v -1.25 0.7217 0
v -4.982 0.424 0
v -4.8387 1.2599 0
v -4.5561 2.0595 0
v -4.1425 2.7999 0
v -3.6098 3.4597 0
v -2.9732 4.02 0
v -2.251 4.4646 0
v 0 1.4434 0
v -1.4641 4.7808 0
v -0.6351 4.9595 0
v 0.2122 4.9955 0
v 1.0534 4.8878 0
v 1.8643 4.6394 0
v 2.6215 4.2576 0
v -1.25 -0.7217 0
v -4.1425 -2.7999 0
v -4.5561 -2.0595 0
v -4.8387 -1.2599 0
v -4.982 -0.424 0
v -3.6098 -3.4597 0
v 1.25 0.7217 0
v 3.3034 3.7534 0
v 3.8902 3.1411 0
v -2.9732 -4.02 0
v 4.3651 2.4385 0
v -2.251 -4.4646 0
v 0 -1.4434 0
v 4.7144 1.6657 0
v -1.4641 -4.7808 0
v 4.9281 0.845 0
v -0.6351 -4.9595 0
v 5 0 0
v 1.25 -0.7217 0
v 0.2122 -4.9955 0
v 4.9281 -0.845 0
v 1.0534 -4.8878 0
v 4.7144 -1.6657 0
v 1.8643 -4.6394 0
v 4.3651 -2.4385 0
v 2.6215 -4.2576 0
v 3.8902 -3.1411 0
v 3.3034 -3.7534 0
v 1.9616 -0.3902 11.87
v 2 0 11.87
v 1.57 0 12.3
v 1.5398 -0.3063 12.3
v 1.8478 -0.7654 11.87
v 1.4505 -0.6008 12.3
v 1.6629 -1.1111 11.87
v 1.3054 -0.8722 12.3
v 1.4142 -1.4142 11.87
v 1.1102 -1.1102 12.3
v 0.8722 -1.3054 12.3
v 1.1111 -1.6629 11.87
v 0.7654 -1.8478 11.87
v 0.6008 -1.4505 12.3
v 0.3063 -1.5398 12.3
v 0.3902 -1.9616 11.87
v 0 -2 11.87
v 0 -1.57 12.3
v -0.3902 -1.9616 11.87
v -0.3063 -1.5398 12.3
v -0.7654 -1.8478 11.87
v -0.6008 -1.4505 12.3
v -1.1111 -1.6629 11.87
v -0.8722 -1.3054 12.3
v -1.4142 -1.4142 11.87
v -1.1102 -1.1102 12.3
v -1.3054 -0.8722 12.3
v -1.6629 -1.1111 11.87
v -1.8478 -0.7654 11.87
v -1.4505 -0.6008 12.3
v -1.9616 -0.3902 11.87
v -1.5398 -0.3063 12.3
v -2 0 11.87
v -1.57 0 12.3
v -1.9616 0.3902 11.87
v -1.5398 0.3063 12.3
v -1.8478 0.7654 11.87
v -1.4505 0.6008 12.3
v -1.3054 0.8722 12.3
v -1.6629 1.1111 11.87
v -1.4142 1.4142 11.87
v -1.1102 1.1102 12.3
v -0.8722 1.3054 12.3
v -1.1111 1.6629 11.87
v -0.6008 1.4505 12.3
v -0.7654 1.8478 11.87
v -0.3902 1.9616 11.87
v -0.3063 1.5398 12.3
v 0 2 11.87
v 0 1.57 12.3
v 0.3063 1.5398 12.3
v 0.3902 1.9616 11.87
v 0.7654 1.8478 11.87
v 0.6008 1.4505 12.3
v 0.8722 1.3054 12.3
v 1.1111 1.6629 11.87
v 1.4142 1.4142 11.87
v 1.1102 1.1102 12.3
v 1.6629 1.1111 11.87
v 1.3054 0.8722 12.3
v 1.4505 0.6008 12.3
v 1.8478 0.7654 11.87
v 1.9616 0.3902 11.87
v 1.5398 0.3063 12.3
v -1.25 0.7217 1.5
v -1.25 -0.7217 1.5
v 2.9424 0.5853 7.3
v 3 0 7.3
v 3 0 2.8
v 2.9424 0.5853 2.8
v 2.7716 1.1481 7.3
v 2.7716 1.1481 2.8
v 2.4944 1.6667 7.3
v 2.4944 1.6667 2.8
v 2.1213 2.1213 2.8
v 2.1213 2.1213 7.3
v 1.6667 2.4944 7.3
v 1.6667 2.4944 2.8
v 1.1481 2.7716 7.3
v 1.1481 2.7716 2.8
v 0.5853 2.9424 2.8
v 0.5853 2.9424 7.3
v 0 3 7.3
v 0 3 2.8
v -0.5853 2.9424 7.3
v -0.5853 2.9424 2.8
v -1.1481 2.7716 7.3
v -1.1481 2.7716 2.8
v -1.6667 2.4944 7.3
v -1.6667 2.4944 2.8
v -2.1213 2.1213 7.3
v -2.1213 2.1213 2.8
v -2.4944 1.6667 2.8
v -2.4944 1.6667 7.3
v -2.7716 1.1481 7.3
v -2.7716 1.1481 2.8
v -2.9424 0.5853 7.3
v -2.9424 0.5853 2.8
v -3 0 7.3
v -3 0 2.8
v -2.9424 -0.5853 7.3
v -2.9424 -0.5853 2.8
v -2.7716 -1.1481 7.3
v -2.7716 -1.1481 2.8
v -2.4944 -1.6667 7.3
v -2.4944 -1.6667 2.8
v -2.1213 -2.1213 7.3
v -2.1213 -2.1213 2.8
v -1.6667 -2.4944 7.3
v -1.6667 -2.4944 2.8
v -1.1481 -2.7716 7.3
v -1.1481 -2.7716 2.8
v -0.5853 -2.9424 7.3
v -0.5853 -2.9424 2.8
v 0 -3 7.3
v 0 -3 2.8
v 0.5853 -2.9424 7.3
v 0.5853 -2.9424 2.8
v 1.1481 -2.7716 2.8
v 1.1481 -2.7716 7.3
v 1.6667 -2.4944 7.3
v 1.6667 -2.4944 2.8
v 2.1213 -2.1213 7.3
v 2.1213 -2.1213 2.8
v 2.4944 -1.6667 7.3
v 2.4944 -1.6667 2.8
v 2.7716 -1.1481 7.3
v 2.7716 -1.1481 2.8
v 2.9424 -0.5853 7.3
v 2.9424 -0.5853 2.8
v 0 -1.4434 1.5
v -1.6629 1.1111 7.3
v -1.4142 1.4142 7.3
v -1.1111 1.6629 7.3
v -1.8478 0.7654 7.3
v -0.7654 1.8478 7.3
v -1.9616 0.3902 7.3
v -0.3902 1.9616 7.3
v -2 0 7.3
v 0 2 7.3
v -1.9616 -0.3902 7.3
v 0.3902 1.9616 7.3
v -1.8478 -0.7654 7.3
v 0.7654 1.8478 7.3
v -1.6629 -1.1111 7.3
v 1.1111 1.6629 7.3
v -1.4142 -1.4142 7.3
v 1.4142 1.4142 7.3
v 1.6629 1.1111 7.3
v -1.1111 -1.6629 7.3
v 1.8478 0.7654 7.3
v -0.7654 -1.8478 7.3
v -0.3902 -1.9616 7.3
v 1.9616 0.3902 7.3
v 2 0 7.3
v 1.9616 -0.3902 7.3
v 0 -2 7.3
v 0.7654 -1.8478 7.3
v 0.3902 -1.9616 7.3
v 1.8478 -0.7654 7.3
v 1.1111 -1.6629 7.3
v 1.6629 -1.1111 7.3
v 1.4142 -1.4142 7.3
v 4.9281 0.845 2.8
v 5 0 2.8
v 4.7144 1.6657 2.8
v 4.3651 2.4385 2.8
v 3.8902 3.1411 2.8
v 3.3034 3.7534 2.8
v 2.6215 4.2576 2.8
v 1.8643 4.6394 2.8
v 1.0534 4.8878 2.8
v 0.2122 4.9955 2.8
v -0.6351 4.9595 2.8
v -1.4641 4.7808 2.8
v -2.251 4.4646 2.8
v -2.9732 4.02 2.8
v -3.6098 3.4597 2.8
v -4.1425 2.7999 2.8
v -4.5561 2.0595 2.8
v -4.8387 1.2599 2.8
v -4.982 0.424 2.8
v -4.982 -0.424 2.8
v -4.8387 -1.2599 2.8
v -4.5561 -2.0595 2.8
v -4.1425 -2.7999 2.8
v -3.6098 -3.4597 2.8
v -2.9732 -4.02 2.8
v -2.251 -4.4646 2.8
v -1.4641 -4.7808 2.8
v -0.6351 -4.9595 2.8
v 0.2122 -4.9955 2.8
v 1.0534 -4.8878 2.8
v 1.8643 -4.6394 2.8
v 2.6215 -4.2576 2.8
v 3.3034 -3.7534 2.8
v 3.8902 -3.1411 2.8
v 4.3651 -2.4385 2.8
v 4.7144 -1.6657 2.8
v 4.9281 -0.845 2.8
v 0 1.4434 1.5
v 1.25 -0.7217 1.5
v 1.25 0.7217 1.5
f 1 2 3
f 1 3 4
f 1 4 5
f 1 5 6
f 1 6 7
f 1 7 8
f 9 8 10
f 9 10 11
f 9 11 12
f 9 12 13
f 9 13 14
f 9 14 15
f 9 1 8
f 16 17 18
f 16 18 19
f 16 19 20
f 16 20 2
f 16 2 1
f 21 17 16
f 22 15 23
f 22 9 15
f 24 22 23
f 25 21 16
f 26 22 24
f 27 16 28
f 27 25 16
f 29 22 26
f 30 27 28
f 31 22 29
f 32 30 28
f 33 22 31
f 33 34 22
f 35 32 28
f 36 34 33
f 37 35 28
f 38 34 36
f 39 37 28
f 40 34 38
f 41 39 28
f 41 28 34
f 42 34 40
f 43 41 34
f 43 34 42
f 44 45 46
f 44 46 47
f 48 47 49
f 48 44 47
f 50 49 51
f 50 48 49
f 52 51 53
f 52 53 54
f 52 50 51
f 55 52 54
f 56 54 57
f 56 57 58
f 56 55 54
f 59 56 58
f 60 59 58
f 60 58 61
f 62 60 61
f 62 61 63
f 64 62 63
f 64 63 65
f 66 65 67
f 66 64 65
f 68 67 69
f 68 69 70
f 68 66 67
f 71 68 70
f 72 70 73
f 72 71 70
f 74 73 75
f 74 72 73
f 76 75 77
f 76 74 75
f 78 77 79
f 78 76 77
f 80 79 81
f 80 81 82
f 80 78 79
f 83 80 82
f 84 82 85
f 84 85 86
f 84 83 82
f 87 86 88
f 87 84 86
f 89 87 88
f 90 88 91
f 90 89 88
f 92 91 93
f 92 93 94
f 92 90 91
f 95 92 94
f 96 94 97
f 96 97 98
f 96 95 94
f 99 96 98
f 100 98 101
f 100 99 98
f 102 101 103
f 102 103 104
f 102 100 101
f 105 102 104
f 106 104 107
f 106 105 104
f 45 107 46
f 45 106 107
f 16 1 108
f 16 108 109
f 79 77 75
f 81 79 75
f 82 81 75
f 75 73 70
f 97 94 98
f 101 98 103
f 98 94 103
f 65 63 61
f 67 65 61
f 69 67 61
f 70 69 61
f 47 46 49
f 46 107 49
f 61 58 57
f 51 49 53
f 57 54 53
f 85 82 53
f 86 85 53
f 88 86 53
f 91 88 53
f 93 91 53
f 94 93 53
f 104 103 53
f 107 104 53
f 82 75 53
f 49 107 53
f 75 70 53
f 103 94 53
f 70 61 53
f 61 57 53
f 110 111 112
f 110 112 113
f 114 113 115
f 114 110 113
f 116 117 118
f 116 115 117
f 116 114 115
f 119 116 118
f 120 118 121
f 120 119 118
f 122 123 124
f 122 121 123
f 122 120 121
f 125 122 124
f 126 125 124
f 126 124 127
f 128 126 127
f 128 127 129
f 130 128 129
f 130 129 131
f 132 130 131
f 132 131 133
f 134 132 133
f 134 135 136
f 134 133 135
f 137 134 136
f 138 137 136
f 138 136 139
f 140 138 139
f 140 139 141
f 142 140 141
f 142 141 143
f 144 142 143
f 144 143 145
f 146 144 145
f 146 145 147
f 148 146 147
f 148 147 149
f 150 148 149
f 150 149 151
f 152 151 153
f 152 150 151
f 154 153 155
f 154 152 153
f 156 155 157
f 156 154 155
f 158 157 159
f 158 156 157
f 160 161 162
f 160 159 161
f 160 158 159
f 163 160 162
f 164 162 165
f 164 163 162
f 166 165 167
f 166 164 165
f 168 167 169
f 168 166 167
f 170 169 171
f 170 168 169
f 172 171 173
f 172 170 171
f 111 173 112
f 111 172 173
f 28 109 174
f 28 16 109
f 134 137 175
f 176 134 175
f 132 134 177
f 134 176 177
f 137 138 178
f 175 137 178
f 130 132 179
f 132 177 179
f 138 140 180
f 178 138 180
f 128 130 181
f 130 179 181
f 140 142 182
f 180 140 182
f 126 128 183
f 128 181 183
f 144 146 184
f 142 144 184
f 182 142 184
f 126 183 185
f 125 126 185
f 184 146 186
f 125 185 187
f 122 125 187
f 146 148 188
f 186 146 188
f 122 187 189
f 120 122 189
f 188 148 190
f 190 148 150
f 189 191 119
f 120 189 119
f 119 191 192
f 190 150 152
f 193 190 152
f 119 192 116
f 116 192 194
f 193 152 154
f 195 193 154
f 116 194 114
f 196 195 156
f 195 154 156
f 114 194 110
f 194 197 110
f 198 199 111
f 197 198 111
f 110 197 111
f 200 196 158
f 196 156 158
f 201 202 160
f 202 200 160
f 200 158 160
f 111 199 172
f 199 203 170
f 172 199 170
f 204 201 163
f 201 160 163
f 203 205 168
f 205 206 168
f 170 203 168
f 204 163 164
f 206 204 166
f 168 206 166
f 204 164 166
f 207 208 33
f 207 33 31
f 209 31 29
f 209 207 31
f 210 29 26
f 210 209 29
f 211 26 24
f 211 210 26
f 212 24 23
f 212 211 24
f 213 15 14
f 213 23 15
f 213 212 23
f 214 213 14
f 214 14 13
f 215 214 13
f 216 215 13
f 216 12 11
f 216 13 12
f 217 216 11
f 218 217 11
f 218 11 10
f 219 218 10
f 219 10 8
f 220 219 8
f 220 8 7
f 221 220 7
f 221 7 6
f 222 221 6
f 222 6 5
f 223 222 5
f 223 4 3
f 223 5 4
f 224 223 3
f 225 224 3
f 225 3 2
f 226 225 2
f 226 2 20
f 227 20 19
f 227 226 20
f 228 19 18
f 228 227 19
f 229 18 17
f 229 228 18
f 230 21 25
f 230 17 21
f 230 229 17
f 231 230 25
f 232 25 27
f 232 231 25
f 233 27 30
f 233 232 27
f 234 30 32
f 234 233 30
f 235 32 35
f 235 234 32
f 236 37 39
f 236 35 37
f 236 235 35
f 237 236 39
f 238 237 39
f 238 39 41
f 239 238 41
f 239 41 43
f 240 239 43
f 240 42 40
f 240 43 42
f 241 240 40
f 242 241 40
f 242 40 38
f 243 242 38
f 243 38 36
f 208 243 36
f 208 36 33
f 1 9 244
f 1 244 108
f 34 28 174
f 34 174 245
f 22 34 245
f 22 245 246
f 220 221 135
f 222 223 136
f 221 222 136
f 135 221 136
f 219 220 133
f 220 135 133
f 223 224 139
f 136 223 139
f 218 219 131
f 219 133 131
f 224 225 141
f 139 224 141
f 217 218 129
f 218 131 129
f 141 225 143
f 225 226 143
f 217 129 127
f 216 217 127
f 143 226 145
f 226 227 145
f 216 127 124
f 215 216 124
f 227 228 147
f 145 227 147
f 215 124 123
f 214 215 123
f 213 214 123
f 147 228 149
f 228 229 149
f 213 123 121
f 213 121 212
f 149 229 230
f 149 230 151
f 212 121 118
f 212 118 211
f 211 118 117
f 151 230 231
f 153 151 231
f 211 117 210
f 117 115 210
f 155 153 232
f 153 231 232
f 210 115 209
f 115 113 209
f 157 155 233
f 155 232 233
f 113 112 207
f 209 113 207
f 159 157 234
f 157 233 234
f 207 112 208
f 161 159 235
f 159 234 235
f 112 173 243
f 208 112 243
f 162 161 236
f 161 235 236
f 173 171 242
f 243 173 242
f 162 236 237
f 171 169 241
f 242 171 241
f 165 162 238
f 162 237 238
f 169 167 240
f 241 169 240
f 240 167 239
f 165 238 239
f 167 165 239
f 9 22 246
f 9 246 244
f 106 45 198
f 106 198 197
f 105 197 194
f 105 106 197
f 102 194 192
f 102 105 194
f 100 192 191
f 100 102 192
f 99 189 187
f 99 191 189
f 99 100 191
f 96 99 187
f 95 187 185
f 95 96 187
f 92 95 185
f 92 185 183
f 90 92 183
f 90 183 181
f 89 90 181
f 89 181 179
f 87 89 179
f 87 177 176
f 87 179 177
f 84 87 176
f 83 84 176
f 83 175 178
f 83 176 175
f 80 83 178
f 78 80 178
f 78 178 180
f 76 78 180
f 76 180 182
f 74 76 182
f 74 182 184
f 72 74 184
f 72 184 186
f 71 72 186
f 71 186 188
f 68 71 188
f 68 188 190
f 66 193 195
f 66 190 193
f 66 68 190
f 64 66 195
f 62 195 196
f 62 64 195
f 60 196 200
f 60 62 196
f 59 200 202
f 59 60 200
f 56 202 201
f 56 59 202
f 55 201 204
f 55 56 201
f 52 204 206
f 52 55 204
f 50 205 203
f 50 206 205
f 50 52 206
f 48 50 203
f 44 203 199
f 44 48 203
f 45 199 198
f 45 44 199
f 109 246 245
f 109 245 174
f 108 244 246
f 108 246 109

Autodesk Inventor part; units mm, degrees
ref_plane "YZ Plane" through (0, 0, 0) normal (1, 0, 0) x (0, 1, 0)
ref_plane "XZ Plane" through (0, 0, 0) normal (0, 1, 0) x (-1, 0, 0)
ref_plane "XY Plane" through (0, 0, 0) normal (0, 0, 1) x (1, 0, 0)
sketch "スケッチ1" plane through (0, 0, 0) normal (0, 1, 0) x (-1, 0, 0)
  line L0 (0, 0) -> (-5, 0)
  line L1 (-5, 0) -> (-5, 2.8)
  line L2 (-5, 2.8) -> (-3, 2.8)
  line L3 (-3, 2.8) -> (-3, 7.3)
  line L4 (-3, 7.3) -> (-2, 7.3)
  line L5 (-2, 7.3) -> (-2, 11.87)
  line L6 (-1.57, 12.3) -> (0, 12.3)
  line L7 (0, 12.3) -> (0, 0)
  line L8 (-1.57, 12.3) -> (-2, 11.87)
  point P0 (-2, 12.3)
  dimension "d0" = 5
  dimension "d1" = 4.5
  dimension "d2" = 2.8
  dimension "d3" = 0.43
  dimension "d4" = 0.43
  dimension "d5" = 4
  dimension "d6" = 10
  dimension "d7" = 6
revolve "回転1" add sketch "スケッチ1" angle 360 about axis through (0, 0, 12.3) along (0, 0, -1)
thread "ねじ1" size "M4x0.7" class "6g" standard "ANSI Metric M Profile" length 7.57 offset 1.2
sketch "スケッチ2" plane through (0, 0, 0) normal (0, 0, -1) x (-1, 0, 0)
  line L0 (0, -1.4434) -> (-1.25, -0.7217)
  line L1 (-1.25, -0.7217) -> (-1.25, 0.7217)
  line L2 (-1.25, 0.7217) -> (0, 1.4434)
  line L3 (0, 1.4434) -> (1.25, 0.7217)
  line L4 (1.25, 0.7217) -> (1.25, -0.7217)
  line L5 (1.25, -0.7217) -> (0, -1.4434)
  point P0 (0, 0)
  point P1 (0, 0)
  dimension "d11" = 2.5
extrude "押し出し1" cut sketch "スケッチ2" against normal blind 1.5
equation "\"d4\" = d3"
properties part number "DBTS4-4.5-5-LTC" material "ステンレス鋼 AISI 304"
